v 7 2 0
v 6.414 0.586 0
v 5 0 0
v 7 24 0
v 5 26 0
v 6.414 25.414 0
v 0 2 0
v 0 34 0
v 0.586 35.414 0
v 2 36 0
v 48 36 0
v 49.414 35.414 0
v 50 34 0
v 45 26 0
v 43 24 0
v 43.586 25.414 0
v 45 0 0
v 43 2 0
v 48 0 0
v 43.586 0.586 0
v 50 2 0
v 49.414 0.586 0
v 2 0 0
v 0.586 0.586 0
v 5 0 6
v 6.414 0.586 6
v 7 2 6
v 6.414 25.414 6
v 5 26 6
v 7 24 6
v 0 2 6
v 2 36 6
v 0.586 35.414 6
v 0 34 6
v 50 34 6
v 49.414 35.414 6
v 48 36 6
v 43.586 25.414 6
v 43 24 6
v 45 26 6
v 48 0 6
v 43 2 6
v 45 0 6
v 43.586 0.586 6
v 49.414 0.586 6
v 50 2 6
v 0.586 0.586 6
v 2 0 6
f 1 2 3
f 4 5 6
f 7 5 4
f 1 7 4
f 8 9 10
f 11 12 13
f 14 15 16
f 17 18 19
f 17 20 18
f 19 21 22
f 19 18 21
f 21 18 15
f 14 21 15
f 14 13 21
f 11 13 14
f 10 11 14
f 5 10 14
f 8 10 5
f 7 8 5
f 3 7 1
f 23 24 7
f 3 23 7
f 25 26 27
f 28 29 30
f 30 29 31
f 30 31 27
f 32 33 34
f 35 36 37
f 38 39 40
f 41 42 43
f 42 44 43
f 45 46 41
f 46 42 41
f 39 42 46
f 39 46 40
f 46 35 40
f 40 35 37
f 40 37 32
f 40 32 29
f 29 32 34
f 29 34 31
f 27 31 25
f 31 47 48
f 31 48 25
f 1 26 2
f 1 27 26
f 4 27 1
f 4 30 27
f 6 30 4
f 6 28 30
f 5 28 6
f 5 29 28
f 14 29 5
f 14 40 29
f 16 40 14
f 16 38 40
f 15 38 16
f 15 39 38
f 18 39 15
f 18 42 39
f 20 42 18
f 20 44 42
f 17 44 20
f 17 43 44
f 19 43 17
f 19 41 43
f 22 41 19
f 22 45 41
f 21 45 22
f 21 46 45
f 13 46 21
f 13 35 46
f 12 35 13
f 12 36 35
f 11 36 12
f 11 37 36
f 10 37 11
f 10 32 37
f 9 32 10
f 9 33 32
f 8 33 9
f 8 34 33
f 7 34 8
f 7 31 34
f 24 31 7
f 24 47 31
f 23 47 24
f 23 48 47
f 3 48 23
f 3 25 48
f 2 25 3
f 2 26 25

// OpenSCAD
$fn = 32;

// ----------------------------------------------------------------------
// Clip blank: staple clip, 6 mm thick
// ----------------------------------------------------------------------

// --- parameters (mm) ---
profile_height = 6;       // extrusion height
profile_points = 24;      // points of the closed outline

profile = [[0, 2], [0.586, 0.586], [2, 0], [5, 0], [6.414, 0.586], [7, 2], [7, 24], [6.414, 25.414], [5, 26], [45, 26], [43.586, 25.414], [43, 24], [43, 2], [43.586, 0.586], [45, 0], [48, 0], [49.414, 0.586], [50, 2], [50, 34], [49.414, 35.414], [48, 36], [2, 36], [0.586, 35.414], [0, 34]];  // single closed polygon, 24 points, counter clockwise

// --- the one profile operation ---
linear_extrude(height = profile_height) polygon(points = profile);
